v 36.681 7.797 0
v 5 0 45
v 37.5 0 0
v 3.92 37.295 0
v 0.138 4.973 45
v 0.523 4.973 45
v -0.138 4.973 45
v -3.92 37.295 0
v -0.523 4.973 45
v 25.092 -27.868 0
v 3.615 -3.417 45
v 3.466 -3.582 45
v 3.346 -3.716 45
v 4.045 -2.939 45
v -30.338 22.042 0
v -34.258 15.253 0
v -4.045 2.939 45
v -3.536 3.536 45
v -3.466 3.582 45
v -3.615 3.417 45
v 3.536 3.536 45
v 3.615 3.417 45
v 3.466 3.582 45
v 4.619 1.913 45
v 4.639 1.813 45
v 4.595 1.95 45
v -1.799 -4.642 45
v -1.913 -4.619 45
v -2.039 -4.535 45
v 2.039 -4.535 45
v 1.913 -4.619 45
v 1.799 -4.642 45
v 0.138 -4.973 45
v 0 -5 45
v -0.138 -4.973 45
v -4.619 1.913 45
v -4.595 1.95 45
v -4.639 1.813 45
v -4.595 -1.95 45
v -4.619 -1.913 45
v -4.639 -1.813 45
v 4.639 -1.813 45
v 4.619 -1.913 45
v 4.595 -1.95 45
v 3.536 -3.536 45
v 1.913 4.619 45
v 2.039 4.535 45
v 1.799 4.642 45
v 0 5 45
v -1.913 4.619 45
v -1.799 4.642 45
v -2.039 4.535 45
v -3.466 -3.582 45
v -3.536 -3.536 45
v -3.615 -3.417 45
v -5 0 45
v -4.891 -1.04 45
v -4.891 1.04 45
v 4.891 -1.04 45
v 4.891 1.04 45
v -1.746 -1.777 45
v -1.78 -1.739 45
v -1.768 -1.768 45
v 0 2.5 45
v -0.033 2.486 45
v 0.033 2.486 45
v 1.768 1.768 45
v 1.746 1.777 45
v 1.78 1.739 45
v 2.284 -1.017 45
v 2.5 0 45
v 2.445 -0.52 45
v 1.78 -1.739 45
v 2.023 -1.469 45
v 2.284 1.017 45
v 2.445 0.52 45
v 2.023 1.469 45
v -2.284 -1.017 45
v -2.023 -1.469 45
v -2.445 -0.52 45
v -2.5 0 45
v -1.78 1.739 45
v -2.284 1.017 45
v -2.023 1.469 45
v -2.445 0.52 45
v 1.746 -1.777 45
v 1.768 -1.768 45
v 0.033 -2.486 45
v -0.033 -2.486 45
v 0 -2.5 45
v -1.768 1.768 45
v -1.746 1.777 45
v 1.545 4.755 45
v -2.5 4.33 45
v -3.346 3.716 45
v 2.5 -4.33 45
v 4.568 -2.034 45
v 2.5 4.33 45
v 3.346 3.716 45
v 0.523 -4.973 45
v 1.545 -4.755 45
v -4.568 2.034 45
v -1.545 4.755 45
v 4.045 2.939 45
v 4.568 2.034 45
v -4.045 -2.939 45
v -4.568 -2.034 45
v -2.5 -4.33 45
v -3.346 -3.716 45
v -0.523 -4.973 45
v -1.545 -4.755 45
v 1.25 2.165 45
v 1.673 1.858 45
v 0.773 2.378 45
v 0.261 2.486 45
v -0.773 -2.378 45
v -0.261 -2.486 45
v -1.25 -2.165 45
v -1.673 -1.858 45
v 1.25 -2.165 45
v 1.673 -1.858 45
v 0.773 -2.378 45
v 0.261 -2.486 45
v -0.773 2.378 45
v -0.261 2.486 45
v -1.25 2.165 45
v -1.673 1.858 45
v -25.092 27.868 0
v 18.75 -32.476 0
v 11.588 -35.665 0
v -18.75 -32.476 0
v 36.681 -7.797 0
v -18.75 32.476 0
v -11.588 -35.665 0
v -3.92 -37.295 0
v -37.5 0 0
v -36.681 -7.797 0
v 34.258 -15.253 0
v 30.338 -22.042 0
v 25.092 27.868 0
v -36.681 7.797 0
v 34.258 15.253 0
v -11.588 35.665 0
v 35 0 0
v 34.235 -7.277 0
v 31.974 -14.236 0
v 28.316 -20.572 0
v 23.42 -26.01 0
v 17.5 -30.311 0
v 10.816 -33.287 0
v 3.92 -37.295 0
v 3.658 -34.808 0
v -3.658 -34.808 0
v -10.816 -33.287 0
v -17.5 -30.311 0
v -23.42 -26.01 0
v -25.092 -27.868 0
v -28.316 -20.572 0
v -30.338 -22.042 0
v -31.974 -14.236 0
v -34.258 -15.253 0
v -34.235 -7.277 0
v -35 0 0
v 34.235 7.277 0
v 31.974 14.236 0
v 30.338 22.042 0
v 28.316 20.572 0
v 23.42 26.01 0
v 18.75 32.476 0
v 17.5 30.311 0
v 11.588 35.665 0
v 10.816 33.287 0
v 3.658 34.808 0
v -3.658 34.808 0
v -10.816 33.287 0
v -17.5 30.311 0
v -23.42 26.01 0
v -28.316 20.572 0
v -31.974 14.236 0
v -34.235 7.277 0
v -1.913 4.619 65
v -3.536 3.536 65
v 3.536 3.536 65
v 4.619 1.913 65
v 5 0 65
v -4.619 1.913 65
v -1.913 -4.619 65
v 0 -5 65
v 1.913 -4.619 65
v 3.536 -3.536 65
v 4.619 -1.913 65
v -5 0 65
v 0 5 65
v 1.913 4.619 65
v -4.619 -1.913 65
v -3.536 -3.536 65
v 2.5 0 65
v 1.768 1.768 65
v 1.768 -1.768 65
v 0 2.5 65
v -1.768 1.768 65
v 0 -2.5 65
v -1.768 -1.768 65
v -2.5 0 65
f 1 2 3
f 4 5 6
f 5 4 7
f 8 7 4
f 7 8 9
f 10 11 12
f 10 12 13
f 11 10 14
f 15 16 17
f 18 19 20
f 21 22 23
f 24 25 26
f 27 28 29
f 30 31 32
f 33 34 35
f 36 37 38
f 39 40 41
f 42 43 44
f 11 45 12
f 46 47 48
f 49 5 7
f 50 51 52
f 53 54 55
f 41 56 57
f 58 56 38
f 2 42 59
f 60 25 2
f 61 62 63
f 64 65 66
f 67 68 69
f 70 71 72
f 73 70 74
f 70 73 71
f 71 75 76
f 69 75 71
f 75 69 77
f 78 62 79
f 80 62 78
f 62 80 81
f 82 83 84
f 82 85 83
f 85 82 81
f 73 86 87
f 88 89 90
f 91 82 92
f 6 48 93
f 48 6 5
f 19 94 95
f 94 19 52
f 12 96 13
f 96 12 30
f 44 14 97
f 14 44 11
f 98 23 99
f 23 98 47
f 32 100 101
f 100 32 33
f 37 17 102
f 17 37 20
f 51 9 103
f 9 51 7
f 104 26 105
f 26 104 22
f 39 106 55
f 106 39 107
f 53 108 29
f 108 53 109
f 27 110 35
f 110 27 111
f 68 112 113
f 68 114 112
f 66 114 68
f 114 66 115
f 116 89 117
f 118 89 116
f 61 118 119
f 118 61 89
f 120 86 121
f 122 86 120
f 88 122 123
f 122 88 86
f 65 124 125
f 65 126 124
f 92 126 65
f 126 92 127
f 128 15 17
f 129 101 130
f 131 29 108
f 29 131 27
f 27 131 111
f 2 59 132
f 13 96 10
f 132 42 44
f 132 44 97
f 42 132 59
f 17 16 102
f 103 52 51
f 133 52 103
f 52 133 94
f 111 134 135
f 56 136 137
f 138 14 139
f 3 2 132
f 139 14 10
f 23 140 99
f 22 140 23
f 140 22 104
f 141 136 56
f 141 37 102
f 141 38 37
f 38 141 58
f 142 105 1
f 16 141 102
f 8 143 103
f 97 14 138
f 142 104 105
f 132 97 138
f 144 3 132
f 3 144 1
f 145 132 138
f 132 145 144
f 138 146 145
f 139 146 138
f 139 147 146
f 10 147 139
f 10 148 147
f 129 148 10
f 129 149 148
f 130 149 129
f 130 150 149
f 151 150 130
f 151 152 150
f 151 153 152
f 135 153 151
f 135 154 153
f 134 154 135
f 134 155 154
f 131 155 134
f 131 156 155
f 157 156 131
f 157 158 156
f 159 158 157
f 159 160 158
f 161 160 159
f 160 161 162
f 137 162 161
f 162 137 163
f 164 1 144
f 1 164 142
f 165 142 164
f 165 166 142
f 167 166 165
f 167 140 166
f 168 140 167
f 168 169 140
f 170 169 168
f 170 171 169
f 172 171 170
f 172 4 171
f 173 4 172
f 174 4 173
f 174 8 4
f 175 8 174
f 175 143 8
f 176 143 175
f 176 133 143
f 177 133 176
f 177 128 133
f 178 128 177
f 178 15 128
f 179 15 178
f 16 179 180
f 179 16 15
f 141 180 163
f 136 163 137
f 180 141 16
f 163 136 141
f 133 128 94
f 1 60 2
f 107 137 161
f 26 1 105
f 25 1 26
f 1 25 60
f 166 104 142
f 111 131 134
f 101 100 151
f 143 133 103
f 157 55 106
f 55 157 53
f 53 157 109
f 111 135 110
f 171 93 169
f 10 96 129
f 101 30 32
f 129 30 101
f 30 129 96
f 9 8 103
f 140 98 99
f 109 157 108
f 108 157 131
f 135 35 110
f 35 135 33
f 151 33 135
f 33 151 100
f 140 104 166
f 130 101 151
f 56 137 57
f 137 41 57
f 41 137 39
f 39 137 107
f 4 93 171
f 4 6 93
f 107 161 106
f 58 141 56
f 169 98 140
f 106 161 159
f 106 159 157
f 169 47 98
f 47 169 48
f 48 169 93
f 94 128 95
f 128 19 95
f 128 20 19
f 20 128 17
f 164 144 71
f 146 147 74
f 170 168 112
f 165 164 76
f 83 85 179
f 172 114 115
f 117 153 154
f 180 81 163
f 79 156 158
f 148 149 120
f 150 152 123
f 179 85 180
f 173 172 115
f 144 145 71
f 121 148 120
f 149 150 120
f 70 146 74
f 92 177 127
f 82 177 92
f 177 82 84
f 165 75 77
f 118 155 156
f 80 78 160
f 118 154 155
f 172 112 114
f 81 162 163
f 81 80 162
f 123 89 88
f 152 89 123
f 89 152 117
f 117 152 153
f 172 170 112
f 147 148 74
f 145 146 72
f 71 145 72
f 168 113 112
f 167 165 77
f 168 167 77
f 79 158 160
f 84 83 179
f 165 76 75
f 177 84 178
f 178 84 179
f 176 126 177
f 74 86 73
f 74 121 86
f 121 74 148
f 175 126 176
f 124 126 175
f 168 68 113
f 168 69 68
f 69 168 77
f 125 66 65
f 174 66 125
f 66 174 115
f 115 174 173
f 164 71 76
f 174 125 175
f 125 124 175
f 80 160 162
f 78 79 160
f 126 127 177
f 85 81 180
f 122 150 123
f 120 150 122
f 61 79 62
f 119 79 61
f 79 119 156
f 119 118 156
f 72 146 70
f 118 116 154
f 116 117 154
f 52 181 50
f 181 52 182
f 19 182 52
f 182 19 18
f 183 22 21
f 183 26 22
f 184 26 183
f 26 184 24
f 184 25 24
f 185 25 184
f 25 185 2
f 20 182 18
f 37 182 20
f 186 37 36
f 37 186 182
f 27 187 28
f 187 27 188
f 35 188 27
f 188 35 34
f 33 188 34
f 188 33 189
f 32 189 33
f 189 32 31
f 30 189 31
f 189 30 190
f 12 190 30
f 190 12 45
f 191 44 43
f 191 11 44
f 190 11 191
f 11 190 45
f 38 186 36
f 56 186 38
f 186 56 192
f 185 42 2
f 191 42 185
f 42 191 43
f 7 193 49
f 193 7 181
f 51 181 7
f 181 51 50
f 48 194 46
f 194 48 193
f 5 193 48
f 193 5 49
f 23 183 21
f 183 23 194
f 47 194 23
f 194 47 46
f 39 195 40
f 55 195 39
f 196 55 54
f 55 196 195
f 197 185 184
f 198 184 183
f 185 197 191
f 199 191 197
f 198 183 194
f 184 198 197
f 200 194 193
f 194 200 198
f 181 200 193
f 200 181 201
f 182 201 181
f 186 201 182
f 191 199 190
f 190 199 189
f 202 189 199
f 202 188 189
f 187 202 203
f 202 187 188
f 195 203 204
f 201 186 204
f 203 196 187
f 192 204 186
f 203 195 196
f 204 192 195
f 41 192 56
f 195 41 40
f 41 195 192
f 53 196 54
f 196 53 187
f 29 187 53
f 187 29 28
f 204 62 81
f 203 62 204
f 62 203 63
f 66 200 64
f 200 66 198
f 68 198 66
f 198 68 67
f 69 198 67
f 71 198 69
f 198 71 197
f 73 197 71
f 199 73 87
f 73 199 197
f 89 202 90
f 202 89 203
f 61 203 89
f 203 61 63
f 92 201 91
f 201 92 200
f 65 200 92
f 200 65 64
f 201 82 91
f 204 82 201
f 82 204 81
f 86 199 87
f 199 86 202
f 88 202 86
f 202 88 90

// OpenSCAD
// Parametric Funnel by Coasterman

// VARIABLES
bottom_diameter = 70;
cone_height = 45;
top_diameter = 5;
top_height = 20;
width = 2.5;

// CODE
union()
{
difference()
{
cylinder(h=cone_height, r1=bottom_diameter/2 + width, r2 = top_diameter/2 + width);
cylinder(h=cone_height, r1=bottom_diameter/2, r2 = top_diameter/2);
}
translate([0, 0, cone_height])
{
difference()
{
cylinder(h=top_height, r=top_diameter/2 + width);
cylinder(h=top_height, r=top_diameter/2);
}
}
}
